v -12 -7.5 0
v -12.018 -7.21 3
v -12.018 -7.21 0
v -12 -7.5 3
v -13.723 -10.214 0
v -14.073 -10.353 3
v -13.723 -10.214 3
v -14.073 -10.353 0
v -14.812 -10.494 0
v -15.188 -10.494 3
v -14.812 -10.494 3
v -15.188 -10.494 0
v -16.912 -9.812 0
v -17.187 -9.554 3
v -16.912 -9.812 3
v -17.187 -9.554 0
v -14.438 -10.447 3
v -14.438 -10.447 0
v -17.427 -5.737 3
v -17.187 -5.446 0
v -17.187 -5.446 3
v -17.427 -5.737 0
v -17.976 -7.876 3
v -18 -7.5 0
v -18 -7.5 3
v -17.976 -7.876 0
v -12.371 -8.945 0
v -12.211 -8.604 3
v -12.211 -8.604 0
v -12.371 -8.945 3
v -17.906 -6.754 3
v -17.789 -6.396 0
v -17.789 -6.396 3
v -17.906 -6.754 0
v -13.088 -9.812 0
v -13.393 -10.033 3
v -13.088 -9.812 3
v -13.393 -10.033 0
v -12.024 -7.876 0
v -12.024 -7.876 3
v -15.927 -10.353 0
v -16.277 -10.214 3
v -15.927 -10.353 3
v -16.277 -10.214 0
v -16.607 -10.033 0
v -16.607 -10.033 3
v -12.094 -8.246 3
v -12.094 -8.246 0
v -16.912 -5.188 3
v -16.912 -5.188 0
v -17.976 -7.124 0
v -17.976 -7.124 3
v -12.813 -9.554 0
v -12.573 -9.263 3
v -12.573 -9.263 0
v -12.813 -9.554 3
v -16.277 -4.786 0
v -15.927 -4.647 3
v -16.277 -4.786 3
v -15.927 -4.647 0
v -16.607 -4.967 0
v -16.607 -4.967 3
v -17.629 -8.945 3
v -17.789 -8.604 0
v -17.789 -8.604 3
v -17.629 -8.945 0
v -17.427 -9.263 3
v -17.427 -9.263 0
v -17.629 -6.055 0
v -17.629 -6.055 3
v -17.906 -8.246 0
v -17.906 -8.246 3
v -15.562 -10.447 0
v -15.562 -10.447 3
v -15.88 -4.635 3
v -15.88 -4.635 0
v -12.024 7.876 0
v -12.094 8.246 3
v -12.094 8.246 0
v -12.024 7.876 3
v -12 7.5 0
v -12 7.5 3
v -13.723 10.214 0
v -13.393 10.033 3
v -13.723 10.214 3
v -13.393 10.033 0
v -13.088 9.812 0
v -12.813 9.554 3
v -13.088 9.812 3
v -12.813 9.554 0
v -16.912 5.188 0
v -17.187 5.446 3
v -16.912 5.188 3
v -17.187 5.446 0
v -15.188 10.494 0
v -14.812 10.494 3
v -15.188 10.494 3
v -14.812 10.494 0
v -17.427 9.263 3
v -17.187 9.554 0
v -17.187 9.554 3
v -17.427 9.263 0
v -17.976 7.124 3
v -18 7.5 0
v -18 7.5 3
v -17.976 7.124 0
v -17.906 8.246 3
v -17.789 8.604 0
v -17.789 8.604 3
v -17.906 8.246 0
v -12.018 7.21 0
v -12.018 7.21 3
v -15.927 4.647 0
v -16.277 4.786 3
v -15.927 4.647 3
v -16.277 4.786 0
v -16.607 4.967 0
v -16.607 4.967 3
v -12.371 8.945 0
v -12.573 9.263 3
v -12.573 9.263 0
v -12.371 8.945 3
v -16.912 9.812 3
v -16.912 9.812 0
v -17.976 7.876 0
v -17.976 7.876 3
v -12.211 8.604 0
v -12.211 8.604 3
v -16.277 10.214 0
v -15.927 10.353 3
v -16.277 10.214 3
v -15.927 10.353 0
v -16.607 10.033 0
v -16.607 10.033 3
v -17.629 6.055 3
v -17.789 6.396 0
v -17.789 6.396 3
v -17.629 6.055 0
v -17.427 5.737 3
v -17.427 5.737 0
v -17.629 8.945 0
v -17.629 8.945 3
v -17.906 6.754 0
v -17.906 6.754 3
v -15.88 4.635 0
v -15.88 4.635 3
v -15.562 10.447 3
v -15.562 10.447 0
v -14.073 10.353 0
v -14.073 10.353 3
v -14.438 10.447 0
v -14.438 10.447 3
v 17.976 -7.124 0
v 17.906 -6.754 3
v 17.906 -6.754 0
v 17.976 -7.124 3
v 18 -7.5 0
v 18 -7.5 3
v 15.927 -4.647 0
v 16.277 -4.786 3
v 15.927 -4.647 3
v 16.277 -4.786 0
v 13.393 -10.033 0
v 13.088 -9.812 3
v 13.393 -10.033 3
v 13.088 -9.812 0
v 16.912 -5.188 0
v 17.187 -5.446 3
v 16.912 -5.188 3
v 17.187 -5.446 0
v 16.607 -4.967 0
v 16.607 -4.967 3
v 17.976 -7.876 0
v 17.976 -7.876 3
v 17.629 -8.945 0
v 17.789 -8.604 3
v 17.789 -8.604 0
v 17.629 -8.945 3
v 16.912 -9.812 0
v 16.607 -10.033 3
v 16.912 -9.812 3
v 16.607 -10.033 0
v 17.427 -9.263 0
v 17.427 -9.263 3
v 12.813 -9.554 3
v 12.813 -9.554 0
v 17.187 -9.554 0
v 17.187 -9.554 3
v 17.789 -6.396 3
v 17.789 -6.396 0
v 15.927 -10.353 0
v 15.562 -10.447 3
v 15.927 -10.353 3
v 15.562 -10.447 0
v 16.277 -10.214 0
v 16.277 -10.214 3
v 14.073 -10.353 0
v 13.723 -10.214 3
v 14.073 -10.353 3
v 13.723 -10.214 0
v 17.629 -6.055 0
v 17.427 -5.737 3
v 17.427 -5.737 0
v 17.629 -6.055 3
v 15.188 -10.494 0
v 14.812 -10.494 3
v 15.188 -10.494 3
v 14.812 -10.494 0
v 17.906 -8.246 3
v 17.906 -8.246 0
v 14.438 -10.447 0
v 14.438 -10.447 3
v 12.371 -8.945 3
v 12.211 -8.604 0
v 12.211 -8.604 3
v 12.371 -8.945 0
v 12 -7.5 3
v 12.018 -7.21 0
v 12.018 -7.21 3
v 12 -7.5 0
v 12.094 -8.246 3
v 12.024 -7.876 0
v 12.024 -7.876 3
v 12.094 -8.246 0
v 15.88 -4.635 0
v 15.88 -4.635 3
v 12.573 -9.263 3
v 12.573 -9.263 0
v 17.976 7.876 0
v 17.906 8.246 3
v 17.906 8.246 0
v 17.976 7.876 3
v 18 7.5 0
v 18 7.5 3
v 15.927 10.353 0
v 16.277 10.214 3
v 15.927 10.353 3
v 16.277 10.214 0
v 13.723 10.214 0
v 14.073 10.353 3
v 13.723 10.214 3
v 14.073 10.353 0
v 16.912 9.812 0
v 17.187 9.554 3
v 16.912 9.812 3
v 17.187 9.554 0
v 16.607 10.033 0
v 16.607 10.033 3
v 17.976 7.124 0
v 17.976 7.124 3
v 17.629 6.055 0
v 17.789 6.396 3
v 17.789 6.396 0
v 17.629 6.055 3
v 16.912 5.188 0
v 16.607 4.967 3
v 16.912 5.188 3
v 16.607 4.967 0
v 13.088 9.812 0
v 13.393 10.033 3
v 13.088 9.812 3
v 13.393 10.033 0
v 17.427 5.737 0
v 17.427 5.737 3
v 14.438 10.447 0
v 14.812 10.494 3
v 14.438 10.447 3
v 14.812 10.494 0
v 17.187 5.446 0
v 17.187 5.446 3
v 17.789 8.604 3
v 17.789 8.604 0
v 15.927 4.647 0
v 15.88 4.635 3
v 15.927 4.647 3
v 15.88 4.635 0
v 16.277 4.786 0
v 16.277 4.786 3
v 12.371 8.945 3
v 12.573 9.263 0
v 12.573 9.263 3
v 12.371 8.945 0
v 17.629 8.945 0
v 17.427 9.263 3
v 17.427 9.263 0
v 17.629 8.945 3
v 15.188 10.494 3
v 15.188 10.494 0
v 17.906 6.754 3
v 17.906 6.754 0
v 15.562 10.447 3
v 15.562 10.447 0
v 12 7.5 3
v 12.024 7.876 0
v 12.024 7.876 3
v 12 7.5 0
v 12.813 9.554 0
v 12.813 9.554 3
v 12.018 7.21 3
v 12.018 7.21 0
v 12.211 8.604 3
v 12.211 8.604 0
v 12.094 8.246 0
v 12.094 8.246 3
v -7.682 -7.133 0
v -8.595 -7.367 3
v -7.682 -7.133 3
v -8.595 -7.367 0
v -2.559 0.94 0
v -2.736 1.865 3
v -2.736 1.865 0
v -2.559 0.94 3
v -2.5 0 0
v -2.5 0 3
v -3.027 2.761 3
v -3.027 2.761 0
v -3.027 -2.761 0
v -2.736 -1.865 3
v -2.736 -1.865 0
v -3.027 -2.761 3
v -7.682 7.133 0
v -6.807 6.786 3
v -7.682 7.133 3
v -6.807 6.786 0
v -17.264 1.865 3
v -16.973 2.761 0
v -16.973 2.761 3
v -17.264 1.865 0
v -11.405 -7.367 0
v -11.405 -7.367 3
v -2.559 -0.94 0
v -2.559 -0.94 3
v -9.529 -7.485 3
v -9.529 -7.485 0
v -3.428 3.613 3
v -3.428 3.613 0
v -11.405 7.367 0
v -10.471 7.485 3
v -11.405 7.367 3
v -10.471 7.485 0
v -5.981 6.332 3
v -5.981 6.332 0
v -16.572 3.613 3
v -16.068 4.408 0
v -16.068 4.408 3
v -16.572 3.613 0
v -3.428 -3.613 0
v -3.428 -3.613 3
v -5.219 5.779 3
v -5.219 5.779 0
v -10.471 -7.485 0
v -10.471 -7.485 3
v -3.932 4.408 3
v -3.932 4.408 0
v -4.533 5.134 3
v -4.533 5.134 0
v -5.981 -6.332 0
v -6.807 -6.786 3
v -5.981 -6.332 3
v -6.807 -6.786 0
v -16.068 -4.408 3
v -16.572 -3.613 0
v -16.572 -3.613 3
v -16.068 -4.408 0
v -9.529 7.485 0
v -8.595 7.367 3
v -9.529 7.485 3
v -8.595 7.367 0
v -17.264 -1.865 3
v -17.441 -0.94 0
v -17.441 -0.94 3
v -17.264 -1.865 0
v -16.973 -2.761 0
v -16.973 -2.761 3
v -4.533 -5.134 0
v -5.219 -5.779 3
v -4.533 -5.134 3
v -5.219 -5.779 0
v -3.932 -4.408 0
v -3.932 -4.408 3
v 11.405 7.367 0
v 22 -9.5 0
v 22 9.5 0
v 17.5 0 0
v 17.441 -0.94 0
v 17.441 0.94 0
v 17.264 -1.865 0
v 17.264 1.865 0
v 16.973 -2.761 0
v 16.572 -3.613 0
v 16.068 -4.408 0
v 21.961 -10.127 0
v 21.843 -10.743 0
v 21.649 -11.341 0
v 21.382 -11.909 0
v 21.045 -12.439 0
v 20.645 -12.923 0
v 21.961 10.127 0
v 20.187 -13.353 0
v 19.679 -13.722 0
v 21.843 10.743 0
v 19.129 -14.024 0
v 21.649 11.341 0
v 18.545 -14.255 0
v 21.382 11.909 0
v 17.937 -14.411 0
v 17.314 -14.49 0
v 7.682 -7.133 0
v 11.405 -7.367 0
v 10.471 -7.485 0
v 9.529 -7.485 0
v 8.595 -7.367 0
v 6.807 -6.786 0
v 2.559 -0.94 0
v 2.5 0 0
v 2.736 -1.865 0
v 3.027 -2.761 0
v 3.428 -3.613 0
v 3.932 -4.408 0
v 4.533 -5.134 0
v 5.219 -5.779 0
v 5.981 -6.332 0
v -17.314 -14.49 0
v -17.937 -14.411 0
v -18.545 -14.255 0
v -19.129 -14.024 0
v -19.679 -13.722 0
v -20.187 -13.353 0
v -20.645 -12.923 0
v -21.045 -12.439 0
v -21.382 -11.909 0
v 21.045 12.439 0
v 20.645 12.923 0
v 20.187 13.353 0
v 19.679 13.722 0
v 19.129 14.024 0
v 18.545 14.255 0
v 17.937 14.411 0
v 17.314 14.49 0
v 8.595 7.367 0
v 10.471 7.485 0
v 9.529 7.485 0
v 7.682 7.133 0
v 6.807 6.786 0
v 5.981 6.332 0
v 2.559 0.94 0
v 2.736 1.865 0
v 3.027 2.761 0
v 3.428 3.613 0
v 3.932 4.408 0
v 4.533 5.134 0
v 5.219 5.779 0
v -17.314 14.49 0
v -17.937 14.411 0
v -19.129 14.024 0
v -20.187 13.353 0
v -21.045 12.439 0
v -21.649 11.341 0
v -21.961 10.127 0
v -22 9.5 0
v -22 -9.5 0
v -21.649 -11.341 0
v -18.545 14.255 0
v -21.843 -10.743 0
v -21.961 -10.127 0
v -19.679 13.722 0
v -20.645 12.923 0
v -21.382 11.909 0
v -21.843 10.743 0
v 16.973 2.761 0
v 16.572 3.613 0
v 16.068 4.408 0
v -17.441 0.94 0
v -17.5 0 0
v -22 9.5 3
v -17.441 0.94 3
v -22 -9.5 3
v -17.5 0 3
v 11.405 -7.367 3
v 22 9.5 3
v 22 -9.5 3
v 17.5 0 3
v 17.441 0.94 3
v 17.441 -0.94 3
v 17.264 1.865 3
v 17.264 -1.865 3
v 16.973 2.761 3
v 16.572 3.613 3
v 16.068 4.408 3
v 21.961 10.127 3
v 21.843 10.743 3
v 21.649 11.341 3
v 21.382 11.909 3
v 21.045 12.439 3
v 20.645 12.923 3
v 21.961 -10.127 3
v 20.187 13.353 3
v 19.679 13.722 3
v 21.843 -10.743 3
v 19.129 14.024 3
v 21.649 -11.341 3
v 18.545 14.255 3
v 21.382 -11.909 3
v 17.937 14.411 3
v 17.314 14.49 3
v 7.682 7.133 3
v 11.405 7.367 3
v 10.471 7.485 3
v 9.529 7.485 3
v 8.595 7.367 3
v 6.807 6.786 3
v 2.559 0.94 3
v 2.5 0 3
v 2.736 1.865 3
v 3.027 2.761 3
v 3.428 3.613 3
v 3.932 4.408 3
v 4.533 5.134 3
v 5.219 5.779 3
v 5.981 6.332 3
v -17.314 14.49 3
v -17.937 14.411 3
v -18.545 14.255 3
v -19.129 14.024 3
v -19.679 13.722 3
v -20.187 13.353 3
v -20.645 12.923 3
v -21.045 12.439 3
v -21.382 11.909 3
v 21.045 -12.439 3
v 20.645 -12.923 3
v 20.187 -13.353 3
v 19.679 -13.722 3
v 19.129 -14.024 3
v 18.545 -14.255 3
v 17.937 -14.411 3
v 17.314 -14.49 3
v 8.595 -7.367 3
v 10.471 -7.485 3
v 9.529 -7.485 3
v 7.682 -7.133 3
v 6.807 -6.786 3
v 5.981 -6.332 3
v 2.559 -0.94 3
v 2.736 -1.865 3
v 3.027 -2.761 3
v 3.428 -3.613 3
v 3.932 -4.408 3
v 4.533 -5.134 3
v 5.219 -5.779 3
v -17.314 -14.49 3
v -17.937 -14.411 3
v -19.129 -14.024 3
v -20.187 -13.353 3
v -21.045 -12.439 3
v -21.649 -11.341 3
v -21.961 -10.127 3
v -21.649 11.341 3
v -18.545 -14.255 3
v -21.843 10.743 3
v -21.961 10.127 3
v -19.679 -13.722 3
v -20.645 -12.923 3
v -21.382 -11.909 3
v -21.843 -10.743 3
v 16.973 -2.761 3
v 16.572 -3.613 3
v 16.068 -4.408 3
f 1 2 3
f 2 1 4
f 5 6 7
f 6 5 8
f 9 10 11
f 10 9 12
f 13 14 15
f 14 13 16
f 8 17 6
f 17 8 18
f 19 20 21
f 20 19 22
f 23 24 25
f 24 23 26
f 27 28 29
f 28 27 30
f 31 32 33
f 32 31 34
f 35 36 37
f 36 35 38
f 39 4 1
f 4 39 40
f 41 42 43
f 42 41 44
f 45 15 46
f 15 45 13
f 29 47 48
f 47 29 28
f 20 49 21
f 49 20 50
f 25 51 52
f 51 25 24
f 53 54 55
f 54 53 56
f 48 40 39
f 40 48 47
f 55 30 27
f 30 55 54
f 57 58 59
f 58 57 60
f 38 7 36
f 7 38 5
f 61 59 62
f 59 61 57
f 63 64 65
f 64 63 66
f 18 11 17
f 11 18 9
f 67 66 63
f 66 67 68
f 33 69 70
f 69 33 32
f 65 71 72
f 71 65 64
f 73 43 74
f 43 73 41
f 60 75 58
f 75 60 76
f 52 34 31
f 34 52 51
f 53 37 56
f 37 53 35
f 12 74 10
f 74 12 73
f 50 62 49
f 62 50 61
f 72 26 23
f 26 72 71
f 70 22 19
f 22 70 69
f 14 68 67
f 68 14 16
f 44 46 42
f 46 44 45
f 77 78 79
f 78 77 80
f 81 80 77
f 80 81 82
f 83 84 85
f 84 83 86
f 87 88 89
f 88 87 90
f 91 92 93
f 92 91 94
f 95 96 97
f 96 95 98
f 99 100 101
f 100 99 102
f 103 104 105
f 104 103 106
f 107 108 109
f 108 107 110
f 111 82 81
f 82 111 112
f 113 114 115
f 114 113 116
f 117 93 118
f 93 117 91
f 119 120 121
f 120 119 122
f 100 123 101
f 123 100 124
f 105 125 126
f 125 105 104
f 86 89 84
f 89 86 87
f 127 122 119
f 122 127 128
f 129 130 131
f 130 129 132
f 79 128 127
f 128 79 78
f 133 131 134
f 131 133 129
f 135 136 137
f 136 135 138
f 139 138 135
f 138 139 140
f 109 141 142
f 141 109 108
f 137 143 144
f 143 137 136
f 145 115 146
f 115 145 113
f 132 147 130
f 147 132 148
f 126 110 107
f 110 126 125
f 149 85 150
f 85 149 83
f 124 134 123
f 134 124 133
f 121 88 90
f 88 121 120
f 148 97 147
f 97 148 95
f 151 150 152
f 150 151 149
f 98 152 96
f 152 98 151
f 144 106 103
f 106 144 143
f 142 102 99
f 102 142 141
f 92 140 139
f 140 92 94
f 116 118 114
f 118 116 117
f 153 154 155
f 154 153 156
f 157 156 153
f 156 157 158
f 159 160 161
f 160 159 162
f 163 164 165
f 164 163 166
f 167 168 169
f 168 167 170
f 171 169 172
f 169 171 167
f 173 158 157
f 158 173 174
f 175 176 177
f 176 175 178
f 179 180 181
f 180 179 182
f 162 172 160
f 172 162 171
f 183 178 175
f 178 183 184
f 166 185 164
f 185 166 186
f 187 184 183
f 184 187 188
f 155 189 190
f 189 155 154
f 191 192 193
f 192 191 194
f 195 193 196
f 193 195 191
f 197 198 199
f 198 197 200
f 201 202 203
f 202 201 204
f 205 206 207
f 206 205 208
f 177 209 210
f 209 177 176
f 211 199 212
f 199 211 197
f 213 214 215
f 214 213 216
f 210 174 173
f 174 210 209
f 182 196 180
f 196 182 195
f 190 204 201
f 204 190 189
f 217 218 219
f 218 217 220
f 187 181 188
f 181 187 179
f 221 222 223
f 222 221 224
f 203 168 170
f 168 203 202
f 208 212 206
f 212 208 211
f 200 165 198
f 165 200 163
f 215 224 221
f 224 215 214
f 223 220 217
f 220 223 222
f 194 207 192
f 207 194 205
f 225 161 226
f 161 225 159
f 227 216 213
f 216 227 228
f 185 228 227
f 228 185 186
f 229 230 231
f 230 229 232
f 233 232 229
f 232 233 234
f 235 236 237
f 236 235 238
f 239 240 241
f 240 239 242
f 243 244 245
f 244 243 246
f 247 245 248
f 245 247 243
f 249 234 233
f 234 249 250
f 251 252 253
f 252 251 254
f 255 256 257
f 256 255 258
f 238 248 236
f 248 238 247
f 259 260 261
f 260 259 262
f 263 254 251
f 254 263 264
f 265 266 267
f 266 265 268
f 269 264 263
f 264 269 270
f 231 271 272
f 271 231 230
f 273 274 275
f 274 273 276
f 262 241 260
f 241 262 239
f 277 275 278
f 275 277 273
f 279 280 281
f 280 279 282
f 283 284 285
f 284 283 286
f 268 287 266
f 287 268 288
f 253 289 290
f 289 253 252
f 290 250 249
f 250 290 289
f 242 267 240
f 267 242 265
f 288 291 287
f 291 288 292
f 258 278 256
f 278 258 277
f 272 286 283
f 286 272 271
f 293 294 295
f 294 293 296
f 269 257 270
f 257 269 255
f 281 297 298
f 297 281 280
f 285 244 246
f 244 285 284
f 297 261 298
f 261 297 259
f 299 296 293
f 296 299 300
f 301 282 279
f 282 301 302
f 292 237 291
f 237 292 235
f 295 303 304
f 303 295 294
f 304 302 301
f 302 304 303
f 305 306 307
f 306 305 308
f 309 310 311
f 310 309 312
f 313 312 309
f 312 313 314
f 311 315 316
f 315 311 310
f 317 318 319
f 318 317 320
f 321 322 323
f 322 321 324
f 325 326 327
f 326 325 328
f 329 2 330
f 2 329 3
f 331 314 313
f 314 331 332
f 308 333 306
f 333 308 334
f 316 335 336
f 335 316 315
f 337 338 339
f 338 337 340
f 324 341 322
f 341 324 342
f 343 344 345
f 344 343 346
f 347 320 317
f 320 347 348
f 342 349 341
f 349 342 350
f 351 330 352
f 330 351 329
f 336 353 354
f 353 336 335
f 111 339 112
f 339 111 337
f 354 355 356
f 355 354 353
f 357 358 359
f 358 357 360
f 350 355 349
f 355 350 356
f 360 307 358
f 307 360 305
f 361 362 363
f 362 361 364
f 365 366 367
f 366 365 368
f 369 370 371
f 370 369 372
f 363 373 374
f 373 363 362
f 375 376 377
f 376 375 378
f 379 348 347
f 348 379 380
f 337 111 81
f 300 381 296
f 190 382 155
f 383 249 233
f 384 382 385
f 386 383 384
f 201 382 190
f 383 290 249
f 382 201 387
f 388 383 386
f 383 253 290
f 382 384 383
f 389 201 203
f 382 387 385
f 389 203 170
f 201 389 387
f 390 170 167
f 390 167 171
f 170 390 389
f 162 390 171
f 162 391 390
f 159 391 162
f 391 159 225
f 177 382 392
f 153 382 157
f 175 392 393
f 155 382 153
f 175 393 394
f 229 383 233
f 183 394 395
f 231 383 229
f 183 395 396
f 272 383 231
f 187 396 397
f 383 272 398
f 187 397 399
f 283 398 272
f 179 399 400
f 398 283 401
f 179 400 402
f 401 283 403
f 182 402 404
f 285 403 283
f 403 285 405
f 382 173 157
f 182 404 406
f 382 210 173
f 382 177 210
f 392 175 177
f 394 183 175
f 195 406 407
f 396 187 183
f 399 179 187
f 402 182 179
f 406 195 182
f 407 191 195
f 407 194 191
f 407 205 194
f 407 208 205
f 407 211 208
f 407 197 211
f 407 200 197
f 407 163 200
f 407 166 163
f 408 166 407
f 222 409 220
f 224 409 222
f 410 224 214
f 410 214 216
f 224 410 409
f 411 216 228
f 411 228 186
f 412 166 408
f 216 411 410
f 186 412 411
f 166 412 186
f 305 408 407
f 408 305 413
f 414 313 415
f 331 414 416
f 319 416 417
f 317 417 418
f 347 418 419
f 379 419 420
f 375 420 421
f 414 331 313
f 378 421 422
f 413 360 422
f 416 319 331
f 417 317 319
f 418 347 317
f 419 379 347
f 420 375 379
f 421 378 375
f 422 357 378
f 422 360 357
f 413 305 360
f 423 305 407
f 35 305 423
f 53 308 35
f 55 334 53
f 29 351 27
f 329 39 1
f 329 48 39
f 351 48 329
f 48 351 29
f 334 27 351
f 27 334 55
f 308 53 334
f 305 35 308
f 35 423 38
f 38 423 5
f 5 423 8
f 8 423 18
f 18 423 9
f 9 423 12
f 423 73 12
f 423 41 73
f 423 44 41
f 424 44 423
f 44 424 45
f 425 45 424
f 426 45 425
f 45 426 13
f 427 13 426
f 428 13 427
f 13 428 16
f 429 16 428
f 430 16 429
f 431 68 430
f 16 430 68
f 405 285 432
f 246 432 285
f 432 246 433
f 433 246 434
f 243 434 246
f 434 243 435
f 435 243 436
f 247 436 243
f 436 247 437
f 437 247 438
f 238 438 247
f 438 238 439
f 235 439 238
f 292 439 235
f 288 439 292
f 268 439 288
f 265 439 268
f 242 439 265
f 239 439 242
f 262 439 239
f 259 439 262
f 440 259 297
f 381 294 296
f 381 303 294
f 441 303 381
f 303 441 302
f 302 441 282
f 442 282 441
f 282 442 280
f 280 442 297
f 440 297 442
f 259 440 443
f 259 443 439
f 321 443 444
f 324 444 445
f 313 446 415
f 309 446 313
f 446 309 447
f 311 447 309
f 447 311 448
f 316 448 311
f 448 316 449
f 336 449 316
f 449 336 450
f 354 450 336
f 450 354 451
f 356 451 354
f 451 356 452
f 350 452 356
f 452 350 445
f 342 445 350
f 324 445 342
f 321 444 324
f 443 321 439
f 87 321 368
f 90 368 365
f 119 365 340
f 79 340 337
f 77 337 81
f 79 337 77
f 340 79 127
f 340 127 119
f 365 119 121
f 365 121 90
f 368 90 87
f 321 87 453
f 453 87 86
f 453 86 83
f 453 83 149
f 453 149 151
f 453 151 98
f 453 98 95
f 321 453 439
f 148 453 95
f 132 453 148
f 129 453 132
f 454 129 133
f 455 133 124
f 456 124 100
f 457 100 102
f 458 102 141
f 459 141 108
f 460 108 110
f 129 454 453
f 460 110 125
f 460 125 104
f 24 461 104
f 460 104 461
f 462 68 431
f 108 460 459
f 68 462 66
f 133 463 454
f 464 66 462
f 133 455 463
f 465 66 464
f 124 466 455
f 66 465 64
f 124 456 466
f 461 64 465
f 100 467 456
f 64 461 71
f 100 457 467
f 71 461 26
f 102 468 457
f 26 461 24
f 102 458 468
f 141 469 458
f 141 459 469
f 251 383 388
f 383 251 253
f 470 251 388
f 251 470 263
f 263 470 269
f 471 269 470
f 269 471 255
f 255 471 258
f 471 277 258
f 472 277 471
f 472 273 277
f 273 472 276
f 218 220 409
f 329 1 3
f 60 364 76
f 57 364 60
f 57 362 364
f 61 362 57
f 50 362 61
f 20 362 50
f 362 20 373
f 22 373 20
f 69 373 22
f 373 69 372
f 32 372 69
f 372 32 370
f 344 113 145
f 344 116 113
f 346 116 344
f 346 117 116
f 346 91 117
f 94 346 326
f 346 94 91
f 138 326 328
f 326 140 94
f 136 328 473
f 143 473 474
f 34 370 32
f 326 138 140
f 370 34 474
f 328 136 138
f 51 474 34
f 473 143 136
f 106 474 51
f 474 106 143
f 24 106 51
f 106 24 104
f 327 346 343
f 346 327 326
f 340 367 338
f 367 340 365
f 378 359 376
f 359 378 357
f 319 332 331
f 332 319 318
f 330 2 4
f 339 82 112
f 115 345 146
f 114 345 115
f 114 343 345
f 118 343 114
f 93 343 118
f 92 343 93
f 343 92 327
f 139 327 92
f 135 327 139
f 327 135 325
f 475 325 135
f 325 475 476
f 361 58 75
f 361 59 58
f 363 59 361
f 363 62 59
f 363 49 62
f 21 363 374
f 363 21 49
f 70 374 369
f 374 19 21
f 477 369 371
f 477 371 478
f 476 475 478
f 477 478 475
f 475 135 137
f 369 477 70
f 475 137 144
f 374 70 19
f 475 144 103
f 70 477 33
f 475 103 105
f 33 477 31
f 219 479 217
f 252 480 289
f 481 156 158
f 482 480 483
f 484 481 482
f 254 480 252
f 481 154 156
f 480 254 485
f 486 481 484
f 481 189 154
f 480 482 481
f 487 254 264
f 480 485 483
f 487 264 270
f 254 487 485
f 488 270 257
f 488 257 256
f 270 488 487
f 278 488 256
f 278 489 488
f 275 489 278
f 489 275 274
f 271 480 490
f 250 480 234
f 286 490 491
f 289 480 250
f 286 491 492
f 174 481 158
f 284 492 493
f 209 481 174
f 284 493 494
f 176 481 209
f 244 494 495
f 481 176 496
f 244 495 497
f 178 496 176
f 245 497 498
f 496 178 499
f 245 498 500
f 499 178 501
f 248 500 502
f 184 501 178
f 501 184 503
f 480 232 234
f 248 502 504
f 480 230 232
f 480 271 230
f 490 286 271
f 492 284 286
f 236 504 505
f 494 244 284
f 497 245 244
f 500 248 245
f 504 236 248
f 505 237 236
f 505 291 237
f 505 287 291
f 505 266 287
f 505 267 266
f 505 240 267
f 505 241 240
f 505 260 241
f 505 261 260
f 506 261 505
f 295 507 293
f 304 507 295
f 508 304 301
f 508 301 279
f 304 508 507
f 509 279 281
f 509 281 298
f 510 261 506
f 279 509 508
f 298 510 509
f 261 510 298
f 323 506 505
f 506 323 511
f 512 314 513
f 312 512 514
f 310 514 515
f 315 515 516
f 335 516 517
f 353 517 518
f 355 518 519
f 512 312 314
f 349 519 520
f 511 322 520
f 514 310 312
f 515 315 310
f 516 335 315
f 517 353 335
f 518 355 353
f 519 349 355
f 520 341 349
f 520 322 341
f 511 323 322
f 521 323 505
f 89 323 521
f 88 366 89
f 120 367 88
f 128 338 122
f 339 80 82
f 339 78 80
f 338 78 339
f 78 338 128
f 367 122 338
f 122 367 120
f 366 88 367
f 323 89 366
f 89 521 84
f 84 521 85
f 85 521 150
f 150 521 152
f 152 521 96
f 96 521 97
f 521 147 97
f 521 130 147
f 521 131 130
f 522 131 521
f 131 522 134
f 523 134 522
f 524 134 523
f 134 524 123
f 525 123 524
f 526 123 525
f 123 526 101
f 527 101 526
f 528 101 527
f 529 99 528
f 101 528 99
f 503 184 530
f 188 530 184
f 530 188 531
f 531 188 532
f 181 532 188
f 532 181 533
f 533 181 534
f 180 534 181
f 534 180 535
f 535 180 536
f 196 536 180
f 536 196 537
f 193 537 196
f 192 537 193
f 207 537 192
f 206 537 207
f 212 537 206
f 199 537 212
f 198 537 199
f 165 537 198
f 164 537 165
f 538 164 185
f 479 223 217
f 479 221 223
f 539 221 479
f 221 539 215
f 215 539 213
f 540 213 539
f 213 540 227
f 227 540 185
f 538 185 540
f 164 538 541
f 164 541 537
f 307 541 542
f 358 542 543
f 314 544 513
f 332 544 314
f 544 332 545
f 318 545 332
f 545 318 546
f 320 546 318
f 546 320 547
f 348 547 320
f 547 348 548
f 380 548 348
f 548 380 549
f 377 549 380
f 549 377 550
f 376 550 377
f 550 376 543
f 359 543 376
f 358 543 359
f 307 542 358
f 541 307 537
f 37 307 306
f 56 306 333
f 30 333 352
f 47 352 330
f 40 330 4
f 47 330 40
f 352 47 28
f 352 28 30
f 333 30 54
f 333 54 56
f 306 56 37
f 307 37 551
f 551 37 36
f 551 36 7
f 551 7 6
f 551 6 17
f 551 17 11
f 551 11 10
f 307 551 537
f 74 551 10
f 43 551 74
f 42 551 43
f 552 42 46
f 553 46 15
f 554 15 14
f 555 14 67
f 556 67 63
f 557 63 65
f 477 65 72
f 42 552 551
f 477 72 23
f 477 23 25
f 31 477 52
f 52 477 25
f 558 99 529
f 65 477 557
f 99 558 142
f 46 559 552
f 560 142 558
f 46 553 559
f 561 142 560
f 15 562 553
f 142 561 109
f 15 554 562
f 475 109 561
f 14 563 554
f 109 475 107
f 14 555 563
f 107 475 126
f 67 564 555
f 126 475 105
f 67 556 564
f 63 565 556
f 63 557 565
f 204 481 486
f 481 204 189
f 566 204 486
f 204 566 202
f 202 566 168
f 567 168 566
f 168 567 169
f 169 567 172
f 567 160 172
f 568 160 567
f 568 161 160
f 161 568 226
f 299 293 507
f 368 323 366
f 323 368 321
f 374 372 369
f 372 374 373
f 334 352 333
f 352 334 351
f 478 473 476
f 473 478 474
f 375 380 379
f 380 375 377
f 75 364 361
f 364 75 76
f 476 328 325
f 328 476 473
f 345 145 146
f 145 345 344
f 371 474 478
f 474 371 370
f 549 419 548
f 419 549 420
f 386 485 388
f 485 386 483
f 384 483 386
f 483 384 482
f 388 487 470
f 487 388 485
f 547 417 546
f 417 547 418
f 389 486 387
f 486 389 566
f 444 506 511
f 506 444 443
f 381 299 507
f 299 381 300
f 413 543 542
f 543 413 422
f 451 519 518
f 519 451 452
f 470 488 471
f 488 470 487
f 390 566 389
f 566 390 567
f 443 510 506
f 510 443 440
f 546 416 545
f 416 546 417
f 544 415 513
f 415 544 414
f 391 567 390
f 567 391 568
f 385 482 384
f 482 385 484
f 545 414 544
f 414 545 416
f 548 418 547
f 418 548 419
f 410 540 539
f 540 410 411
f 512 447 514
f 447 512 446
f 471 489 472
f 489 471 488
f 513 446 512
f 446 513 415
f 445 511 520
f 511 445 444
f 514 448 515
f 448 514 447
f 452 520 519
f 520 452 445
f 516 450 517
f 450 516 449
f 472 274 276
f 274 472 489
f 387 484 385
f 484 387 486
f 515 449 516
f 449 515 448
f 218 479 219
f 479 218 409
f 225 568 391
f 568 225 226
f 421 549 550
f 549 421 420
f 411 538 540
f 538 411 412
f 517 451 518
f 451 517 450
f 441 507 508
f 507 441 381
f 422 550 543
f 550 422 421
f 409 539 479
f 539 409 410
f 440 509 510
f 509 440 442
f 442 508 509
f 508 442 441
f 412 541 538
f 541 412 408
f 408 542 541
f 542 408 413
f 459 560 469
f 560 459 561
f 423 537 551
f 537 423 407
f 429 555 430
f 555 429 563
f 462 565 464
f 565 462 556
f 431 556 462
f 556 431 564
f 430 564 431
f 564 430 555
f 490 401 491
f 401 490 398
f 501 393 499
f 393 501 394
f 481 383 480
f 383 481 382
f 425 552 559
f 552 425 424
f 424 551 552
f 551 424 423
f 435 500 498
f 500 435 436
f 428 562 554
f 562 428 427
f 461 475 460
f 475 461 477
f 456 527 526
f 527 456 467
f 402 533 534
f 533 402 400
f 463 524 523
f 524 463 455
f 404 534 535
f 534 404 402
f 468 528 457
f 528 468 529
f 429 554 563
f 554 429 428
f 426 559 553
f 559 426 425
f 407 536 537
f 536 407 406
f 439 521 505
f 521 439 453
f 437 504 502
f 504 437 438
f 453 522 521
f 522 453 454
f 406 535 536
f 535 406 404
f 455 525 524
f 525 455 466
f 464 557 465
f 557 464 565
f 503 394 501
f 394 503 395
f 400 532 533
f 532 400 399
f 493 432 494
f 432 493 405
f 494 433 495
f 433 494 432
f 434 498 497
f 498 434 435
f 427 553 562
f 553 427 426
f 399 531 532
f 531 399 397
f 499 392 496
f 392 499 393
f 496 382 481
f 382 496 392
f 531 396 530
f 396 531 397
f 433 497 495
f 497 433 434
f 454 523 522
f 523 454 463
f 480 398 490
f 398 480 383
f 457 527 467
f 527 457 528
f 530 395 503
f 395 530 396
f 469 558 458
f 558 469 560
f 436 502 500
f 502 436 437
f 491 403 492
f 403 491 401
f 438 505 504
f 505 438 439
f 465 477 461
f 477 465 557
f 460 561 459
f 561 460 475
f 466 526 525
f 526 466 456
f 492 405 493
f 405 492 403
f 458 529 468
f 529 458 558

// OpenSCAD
$fn = 50;


difference() {
	union() {
		hull() {
			translate(v = [-17.0000000000, 9.5000000000, 0]) {
				cylinder(h = 3, r = 5);
			}
			translate(v = [17.0000000000, 9.5000000000, 0]) {
				cylinder(h = 3, r = 5);
			}
			translate(v = [-17.0000000000, -9.5000000000, 0]) {
				cylinder(h = 3, r = 5);
			}
			translate(v = [17.0000000000, -9.5000000000, 0]) {
				cylinder(h = 3, r = 5);
			}
		}
	}
	union() {
		#translate(v = [-15.0000000000, -7.5000000000, -100.0000000000]) {
			cylinder(h = 200, r = 3.0000000000);
		}
		#translate(v = [-15.0000000000, 7.5000000000, -100.0000000000]) {
			cylinder(h = 200, r = 3.0000000000);
		}
		#translate(v = [15.0000000000, -7.5000000000, -100.0000000000]) {
			cylinder(h = 200, r = 3.0000000000);
		}
		#translate(v = [15.0000000000, 7.5000000000, -100.0000000000]) {
			cylinder(h = 200, r = 3.0000000000);
		}
		#translate(v = [-10.0000000000, 0, 0]) {
			cylinder(h = 3, r = 7.5000000000);
		}
		#translate(v = [10.0000000000, 0, 0]) {
			cylinder(h = 3, r = 7.5000000000);
		}
	}
}
